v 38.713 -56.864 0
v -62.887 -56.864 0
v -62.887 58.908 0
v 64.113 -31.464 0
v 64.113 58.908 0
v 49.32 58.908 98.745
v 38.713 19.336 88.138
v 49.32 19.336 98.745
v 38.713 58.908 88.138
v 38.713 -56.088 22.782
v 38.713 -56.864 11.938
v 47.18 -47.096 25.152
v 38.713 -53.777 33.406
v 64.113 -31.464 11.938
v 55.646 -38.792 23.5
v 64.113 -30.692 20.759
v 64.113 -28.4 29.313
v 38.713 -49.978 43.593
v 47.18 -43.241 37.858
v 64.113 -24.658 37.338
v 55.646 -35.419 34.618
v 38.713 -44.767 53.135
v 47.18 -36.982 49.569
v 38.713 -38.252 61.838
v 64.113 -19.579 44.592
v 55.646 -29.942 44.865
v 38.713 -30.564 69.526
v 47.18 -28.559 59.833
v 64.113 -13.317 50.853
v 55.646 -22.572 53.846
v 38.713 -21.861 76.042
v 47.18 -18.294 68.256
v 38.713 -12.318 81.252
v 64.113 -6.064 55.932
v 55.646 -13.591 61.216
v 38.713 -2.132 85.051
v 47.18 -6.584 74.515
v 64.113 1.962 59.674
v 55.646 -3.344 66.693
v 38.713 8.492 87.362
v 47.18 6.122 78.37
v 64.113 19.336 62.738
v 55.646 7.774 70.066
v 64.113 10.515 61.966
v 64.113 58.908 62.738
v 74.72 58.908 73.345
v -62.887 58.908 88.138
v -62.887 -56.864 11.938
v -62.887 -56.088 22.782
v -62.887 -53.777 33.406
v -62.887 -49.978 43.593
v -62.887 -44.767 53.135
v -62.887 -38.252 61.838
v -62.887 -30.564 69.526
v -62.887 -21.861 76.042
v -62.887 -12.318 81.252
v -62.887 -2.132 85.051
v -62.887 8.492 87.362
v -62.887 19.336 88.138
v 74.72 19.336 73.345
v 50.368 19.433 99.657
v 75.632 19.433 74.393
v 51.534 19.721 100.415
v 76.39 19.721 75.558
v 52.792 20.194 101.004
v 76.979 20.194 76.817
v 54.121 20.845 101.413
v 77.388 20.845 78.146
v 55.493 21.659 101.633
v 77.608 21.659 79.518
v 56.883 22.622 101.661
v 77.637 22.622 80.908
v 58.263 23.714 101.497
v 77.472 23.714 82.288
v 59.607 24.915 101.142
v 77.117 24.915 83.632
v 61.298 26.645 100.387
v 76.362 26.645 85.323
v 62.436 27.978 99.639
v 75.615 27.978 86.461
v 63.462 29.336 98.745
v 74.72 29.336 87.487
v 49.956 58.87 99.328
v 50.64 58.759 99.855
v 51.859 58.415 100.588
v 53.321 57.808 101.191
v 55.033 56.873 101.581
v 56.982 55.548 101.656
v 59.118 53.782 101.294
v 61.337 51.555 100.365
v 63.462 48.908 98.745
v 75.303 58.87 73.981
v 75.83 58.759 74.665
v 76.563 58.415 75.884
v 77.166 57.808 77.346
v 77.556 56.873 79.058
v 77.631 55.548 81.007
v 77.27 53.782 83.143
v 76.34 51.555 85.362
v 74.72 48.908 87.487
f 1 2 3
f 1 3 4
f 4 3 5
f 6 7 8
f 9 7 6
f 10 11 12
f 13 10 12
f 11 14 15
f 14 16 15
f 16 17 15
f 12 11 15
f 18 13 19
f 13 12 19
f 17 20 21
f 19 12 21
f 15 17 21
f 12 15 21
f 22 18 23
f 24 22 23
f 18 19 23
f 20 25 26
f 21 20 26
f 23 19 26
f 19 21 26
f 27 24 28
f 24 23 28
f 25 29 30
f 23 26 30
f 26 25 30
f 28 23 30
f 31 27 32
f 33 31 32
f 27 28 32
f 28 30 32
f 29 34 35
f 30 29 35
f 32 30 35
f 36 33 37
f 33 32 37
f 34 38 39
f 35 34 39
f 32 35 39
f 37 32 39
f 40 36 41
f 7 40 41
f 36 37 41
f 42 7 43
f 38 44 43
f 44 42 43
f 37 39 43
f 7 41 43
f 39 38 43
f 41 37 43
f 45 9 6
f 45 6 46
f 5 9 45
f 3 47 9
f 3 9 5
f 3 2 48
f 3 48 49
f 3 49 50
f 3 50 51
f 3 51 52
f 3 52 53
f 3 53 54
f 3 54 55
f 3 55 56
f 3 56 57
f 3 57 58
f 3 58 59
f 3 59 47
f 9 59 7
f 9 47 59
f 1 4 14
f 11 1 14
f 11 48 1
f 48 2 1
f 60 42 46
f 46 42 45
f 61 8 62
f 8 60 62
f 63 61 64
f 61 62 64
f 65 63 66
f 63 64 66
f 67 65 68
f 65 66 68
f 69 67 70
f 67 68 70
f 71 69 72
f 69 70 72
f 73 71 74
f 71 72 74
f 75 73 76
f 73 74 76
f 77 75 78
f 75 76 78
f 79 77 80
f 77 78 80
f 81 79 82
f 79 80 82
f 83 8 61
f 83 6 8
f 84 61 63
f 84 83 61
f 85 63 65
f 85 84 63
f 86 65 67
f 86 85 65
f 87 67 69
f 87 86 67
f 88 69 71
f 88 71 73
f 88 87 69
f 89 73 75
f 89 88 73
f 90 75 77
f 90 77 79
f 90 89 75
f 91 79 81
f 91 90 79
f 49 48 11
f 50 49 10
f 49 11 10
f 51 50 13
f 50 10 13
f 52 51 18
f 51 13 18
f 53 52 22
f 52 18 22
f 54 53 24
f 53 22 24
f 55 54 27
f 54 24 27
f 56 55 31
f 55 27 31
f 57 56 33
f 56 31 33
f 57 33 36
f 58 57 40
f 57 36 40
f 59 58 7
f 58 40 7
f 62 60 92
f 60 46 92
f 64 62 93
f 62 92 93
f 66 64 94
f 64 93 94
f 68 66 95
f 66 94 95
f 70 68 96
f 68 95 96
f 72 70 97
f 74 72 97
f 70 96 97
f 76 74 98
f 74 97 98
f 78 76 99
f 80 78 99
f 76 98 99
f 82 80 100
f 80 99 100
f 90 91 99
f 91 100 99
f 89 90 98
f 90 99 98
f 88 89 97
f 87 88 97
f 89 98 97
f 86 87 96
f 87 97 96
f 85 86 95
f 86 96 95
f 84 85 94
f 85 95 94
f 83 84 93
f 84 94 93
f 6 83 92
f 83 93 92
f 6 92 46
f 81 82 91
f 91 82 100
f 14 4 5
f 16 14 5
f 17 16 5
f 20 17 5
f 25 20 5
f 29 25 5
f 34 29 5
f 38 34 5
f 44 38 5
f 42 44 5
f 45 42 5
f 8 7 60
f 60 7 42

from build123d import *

# Parameters (mm, degrees)
F0_W     = 127
F0_H     = 115.7713381711
F1_DEPTH = 88.138
F2_R     = 76.2
F3_SIZE  = 25.4
F4_DEPTH = 25
F5_R     = 10


# Not quite as in the source:
# - a feature of the source that left no trace in its solid (it failed there, or was rolled back) is left out


with BuildPart() as f1:
    # F0 (on Top) → F1 (new body)
    with BuildSketch(Plane.XY):
        with Locations((0.6131026894, 1.0218378156)):
            Rectangle(F0_W, F0_H)
    extrude(amount=F1_DEPTH)

    # F2
    f2_edges = [f1.edges().sort_by_distance(p)[0] for p in [
        (0.613103, -56.863831, 88.138),
    ]]
    fillet(f2_edges, radius=F2_R)

    # F3
    f3_edges = [f1.edges().sort_by_distance(p)[0] for p in [
        (64.113103, 39.121838, 88.138),
        (64.113103, -56.863831, 5.969),
        (64.113103, -34.545368, 65.819537),
    ]]
    chamfer(f3_edges, length=F3_SIZE)

    # F4 (add): a face of the model
    f4_faces = [f1.faces().sort_by_distance(p)[0] for p in [
        (51.4131026894, 39.1218378156, 75.438),
    ]]
    extrude(f4_faces, amount=F4_DEPTH)

    # F5
    f5_edges = [f1.edges().sort_by_distance(p)[0] for p in [
        (69.090772, 58.907507, 93.11567),
        (69.090772, 19.336169, 93.11567),
        (56.390772, 39.121838, 105.81567),
        (81.790772, 39.121838, 80.41567),
    ]]
    fillet(f5_edges, radius=F5_R)


solid = f1.part
